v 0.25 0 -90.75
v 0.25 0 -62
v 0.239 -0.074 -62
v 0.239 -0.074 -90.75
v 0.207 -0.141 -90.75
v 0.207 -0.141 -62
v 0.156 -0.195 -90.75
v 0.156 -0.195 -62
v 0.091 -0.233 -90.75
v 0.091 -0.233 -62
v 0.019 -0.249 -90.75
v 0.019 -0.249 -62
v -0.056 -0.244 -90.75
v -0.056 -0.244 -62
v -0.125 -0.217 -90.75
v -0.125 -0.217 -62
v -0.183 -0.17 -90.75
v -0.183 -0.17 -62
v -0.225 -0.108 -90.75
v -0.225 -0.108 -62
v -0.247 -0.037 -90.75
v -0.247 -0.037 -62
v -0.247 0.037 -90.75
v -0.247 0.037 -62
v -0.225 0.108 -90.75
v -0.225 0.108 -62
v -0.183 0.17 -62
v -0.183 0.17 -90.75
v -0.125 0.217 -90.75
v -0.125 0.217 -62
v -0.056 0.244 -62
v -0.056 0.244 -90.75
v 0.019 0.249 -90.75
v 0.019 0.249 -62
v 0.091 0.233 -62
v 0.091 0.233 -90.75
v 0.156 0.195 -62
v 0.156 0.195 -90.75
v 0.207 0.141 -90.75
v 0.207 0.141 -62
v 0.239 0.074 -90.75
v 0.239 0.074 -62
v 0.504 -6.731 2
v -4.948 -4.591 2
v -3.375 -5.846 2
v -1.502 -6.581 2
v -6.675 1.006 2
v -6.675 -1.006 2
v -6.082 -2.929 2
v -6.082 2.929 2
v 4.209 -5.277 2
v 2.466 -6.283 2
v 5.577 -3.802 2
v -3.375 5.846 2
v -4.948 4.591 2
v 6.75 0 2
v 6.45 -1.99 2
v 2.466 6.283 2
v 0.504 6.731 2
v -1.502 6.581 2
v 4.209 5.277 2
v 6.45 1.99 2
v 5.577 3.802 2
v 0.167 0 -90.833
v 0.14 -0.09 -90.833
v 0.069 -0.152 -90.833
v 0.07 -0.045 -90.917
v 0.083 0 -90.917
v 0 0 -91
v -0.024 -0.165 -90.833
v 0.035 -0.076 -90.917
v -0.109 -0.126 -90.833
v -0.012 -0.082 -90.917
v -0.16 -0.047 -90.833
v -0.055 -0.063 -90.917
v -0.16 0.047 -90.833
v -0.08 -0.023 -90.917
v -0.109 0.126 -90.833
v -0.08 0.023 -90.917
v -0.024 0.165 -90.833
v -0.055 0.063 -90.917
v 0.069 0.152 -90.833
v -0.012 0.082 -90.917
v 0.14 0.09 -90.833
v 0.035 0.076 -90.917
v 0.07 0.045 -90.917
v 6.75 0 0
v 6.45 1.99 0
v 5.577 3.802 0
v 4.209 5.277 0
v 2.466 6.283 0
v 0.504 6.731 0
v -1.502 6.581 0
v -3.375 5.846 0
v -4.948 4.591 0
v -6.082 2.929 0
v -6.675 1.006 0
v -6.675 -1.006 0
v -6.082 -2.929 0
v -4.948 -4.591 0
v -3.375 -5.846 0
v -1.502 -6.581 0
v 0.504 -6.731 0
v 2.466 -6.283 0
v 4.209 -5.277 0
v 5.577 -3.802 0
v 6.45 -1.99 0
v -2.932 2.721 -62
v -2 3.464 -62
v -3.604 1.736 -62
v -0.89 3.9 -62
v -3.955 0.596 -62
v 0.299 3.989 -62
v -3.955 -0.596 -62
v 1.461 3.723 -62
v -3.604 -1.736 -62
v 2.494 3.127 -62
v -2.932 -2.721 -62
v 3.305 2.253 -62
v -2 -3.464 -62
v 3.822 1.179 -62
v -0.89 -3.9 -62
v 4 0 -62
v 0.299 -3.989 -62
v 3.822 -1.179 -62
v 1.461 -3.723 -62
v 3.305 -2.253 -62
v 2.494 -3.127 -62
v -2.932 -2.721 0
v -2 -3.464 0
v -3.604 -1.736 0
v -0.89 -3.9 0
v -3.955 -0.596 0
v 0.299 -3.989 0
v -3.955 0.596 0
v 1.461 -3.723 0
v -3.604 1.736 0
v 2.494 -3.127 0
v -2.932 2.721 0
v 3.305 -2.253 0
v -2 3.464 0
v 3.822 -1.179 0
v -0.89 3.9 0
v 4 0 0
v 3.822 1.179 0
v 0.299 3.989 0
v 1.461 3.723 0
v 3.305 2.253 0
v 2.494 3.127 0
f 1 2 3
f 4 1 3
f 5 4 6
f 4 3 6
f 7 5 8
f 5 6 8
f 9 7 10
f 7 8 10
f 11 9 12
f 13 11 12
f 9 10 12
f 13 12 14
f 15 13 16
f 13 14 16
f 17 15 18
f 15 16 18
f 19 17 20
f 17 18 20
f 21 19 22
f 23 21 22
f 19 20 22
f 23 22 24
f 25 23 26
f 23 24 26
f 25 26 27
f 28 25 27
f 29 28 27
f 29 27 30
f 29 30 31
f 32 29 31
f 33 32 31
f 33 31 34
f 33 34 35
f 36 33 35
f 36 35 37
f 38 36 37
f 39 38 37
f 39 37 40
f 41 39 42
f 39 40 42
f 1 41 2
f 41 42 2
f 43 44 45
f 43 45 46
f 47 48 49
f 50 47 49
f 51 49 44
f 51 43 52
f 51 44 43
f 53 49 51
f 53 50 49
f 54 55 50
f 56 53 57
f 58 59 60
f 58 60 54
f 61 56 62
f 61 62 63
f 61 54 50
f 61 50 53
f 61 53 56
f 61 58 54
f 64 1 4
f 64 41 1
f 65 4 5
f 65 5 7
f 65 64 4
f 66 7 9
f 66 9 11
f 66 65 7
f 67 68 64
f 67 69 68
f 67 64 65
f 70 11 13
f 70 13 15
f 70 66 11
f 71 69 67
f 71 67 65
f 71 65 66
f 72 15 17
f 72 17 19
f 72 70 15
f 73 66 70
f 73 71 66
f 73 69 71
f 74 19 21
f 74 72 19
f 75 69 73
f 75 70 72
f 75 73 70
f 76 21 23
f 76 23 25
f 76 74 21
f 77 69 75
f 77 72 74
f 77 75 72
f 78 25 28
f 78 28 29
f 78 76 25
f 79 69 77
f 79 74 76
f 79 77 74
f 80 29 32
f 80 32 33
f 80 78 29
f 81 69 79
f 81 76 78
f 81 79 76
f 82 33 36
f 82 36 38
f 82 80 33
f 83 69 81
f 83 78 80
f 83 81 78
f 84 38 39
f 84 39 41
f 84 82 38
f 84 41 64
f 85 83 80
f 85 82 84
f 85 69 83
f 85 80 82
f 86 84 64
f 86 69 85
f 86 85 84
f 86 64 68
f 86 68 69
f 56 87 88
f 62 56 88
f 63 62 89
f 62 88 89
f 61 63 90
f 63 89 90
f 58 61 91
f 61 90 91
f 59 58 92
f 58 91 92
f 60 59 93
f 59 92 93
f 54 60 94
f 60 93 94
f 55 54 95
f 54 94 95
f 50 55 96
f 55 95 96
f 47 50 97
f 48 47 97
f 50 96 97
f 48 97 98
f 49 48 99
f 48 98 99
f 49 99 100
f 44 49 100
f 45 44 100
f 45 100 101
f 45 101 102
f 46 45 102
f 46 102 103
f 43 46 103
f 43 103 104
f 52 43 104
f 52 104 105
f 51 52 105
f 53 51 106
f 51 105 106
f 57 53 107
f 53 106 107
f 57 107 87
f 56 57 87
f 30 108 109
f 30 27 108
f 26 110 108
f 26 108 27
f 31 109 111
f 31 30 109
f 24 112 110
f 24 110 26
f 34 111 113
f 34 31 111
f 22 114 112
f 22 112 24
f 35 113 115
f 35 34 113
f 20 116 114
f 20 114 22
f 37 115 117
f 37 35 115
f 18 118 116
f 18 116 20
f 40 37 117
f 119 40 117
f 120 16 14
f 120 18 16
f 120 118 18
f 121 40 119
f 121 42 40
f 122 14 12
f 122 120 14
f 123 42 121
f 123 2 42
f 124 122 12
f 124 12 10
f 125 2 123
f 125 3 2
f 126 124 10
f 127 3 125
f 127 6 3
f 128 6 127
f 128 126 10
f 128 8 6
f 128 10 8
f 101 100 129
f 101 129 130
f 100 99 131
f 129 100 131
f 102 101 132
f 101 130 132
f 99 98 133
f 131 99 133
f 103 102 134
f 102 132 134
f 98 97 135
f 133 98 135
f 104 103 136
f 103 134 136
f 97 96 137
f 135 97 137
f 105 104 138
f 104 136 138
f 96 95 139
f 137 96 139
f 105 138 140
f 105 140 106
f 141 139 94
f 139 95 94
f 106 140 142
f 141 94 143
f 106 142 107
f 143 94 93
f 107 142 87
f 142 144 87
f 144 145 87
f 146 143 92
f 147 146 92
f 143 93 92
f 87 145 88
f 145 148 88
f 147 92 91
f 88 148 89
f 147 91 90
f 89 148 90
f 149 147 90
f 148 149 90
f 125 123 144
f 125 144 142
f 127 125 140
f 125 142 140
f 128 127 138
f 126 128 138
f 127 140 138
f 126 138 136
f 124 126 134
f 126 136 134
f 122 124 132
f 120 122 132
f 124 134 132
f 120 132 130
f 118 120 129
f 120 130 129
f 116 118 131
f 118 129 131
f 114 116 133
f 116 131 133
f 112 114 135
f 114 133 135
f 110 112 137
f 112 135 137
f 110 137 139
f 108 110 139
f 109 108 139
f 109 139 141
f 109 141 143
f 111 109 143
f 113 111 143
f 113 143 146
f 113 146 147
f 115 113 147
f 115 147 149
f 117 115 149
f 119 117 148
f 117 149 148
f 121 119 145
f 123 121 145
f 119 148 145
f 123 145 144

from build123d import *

# Parameters (mm, degrees)
F0_R     = 6.75
F1_DEPTH = 2
F2_R     = 4
F3_DEPTH = 62
F4_R     = 0.25
F5_DEPTH = 29
F6_SIZE  = 0.25


with BuildPart() as f1:
    # F0 (on Top) → F1 (new body)
    with BuildSketch(Plane.XY):
        Circle(F0_R)
    extrude(amount=F1_DEPTH)

    # F2 (on face) → F3 (join)
    with BuildSketch(Plane(origin=(0, 0, 0), x_dir=(1, 0, 0), z_dir=(0, 0, -1))):
        Circle(F2_R)
    extrude(amount=F3_DEPTH)

    # F4 (on face) → F5 (join)
    with BuildSketch(Plane(origin=(0, 0, -62), x_dir=(1, 0, 0), z_dir=(0, 0, -1))):
        Circle(F4_R)
    extrude(amount=F5_DEPTH)

    # F6
    f6_edges = [f1.edges().sort_by_distance(p)[0] for p in [
        (-0.25, 0, -91),
    ]]
    chamfer(f6_edges, length=F6_SIZE)


solid = f1.part
